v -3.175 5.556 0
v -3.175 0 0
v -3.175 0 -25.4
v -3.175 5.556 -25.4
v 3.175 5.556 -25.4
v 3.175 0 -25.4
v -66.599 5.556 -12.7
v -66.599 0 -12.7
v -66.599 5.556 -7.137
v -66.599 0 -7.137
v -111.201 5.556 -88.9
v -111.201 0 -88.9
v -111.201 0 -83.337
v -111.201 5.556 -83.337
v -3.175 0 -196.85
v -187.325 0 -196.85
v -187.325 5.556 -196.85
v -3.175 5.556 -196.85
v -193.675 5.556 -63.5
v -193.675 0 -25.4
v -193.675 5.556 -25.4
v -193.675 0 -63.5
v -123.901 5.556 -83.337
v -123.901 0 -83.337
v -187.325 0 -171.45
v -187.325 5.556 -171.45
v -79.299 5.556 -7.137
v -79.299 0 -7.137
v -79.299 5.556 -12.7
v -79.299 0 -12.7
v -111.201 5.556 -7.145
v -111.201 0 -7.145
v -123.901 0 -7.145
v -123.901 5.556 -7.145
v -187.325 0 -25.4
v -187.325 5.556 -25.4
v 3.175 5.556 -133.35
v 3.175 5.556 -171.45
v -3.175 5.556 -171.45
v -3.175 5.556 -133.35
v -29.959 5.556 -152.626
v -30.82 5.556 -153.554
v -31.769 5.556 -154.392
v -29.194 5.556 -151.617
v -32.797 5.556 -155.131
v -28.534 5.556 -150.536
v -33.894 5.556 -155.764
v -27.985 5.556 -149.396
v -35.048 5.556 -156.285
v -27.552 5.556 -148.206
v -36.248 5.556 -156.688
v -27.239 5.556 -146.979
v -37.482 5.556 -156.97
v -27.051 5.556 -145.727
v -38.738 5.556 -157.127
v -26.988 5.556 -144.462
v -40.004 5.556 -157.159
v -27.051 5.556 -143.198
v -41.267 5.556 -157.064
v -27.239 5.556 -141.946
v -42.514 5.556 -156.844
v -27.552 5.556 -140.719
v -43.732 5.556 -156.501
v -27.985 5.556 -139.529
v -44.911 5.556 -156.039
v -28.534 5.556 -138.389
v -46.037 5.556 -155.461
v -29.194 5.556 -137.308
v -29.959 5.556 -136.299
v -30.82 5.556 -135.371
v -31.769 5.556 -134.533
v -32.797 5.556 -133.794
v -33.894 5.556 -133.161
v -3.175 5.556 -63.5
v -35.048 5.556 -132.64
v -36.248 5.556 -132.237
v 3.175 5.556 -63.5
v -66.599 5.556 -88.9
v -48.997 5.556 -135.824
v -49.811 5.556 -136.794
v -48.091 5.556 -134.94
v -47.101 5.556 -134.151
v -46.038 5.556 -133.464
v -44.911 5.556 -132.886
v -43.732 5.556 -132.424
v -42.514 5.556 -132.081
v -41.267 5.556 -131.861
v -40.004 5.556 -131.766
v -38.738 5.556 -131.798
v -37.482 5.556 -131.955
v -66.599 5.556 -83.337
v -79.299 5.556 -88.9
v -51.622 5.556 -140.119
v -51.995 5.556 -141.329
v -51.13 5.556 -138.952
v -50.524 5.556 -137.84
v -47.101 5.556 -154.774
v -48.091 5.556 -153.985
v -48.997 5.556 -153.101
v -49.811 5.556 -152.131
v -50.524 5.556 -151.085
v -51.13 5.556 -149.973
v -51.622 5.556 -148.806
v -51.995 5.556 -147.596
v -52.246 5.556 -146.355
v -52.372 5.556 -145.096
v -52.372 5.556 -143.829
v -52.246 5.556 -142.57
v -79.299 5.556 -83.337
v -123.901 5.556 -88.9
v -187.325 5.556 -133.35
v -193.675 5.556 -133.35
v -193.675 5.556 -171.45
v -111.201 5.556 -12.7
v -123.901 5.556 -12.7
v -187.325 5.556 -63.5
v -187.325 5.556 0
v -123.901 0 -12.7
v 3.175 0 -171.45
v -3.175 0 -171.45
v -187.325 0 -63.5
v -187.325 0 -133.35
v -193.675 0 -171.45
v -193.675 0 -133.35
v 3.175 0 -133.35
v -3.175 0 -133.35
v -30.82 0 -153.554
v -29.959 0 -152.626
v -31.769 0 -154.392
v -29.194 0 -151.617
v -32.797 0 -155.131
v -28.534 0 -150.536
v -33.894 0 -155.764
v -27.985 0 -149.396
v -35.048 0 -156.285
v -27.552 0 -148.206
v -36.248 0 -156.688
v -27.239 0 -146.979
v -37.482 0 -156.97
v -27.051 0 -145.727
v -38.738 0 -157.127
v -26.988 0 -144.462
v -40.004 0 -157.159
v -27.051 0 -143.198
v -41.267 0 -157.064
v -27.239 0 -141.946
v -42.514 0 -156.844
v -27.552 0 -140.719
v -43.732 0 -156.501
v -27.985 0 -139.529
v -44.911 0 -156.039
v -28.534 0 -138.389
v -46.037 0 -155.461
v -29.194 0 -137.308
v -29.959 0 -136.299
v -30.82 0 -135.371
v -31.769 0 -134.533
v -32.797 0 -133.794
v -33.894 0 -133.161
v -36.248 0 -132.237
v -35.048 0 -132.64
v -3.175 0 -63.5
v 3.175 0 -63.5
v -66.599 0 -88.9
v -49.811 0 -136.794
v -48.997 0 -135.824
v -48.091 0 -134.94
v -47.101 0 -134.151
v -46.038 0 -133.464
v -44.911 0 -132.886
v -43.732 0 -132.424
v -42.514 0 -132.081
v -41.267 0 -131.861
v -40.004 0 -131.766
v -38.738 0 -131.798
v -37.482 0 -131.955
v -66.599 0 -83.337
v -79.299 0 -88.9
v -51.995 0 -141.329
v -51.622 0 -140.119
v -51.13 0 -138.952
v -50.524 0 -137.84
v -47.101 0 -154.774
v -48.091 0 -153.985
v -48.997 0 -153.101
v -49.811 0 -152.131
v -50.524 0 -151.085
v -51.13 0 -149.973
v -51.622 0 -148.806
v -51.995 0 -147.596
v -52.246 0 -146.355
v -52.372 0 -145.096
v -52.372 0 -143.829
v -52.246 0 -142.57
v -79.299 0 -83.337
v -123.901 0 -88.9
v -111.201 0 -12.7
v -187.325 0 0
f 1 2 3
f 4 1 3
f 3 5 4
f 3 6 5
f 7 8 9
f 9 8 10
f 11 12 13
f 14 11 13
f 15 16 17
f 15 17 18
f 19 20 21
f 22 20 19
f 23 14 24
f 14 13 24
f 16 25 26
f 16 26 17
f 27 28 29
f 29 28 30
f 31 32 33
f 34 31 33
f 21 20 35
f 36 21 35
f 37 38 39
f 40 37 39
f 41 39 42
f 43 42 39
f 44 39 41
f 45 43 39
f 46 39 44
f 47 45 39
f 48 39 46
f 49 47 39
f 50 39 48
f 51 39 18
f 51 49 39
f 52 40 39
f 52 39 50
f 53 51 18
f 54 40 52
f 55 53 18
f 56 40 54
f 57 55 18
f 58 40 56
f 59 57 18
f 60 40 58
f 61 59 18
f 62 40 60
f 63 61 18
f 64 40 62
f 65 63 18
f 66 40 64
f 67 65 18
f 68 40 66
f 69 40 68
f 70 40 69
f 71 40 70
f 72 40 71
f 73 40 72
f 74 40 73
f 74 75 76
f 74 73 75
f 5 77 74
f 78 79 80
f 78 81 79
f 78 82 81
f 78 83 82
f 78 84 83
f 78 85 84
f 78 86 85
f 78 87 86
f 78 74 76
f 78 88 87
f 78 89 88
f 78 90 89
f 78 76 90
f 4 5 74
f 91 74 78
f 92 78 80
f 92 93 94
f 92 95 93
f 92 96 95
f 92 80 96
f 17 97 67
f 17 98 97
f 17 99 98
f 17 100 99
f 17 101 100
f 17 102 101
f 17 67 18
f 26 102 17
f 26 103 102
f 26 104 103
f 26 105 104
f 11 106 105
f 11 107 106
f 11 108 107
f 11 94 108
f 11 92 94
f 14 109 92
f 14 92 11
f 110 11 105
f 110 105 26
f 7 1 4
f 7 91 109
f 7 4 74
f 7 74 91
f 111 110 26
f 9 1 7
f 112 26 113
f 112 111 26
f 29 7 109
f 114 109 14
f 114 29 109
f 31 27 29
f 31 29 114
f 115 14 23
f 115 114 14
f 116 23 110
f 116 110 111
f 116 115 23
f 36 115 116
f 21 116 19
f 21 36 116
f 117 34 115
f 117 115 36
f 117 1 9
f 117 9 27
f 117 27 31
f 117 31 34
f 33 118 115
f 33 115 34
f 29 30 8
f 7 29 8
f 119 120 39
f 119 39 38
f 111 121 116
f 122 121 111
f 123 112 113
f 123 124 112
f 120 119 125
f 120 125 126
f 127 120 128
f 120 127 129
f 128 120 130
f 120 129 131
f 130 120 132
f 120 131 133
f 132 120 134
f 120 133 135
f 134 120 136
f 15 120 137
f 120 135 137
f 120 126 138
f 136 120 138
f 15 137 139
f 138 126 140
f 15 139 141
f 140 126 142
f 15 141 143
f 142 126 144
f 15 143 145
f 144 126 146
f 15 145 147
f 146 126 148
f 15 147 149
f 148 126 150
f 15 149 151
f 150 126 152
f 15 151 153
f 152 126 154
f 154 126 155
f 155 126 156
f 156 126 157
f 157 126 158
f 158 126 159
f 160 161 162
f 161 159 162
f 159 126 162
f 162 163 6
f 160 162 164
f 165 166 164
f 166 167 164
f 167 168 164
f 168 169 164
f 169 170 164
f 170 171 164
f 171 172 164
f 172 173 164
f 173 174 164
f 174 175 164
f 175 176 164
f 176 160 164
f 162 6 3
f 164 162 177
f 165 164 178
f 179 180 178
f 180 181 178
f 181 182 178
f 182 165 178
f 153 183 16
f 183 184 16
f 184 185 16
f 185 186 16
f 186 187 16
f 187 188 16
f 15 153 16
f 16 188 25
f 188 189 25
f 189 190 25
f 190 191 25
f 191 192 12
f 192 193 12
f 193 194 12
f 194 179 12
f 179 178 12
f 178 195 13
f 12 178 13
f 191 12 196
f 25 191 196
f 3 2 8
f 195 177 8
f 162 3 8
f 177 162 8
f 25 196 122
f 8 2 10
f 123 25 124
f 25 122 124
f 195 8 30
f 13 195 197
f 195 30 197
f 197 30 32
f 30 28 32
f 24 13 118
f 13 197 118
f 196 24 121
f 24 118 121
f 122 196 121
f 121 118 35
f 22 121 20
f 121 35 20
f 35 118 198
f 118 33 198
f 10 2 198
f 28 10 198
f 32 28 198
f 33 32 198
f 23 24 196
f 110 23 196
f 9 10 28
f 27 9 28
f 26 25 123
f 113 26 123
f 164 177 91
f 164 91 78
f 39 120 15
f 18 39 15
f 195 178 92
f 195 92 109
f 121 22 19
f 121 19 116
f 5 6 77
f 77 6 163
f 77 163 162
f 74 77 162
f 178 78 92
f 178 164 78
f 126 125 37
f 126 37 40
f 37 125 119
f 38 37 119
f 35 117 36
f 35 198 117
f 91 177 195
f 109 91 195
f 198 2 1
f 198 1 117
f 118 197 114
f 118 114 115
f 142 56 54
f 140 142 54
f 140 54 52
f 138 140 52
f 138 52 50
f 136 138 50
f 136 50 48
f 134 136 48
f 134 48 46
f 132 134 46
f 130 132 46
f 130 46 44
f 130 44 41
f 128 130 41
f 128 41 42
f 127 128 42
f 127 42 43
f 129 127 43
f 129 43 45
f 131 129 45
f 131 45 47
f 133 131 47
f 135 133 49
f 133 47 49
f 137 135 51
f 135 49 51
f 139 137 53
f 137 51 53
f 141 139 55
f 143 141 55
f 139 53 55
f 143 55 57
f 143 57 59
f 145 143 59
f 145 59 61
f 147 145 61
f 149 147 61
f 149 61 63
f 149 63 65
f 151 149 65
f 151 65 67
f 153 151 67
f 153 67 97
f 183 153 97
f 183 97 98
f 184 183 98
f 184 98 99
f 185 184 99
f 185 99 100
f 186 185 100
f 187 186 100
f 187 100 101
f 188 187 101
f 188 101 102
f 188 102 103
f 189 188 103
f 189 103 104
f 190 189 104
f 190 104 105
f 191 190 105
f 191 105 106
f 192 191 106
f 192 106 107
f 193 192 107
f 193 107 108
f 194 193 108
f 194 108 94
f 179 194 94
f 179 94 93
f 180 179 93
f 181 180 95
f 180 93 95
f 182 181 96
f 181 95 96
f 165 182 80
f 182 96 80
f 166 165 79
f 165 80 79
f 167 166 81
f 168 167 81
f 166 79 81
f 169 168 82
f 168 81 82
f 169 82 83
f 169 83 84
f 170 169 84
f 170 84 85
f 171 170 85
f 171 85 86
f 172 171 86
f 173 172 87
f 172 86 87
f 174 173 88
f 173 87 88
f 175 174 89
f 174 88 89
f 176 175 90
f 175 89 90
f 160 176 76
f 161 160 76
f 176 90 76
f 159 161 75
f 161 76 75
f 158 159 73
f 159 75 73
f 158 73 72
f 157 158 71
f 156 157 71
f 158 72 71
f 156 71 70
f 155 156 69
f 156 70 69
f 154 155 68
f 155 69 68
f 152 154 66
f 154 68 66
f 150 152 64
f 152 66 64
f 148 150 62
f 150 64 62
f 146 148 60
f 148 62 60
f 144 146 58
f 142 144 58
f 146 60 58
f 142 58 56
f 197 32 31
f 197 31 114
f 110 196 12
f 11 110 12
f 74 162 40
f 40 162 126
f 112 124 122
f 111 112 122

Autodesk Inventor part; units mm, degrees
ref_plane "YZ Plane" through (0, 0, 0) normal (1, 0, 0) x (0, 1, 0)
ref_plane "XZ Plane" through (0, 0, 0) normal (0, 1, 0) x (-1, 0, 0)
ref_plane "XY Plane" through (0, 0, 0) normal (0, 0, 1) x (1, 0, 0)
sketch "Sketch1" plane through (0, 0, 0) normal (0, 1, 0) x (-1, 0, 0)
  line L0 (3.175, 0) -> (187.325, 0)
  line L1 (187.325, -196.85) -> (3.175, -196.85)
  line L2 (111.2012, -7.145) -> (111.2012, -12.7)
  line L3 (111.2012, -12.7) -> (123.9012, -12.7)
  line L4 (123.9012, -12.7) -> (123.9012, -7.145)
  line L5 (79.2988, -7.1374) -> (79.2988, -12.7)
  line L6 (79.2988, -12.7) -> (66.5988, -12.7)
  line L7 (66.5988, -12.7) -> (66.5988, -7.1374)
  line L8 (66.5988, -88.9) -> (79.2988, -88.9)
  line L9 (79.2988, -88.9) -> (79.2988, -83.3374)
  line L10 (66.5988, -83.3374) -> (66.5988, -88.9)
  line L11 (123.9012, -88.9) -> (111.2012, -88.9)
  line L12 (111.2012, -88.9) -> (111.2012, -83.3374)
  line L13 (123.9012, -83.3374) -> (123.9012, -88.9)
  line L14 (190.5, -25.4) -> (193.675, -25.4)
  line L15 (193.675, -63.5) -> (190.5, -63.5)
  line L16 (0, -25.4) -> (-3.175, -25.4)
  line L17 (-3.175, -63.5) -> (0, -63.5)
  line L18 (190.5, -171.45) -> (193.675, -171.45)
  line L19 (193.675, -133.35) -> (190.5, -133.35)
  line L20 (0, -171.45) -> (-3.175, -171.45)
  line L21 (-3.175, -133.35) -> (0, -133.35)
  line L22 (190.5, -171.45) -> (193.675, -171.45)
  line L23 (190.5, -25.4) -> (187.325, -25.4)
  line L24 (190.5, -63.5) -> (187.325, -63.5)
  line L25 (190.5, -133.35) -> (187.325, -133.35)
  line L26 (190.5, -171.45) -> (187.325, -171.45)
  line L27 (193.675, -25.4) -> (193.675, -63.5)
  line L28 (193.675, -133.35) -> (193.675, -171.45)
  line L29 (187.325, -171.45) -> (187.325, -196.85)
  line L30 (187.325, 0) -> (187.325, -25.4)
  line L31 (187.325, -63.5) -> (187.325, -133.35)
  line L32 (0, -171.45) -> (3.175, -171.45)
  line L33 (0, -133.35) -> (3.175, -133.35)
  line L34 (0, -63.5) -> (3.175, -63.5)
  line L35 (0, -25.4) -> (3.175, -25.4)
  line L36 (-3.175, -25.4) -> (-3.175, -63.5)
  line L37 (-3.175, -133.35) -> (-3.175, -171.45)
  line L38 (3.175, 0) -> (3.175, -25.4)
  line L39 (3.175, -63.5) -> (3.175, -133.35)
  line L40 (3.175, -171.45) -> (3.175, -196.85)
  line L41 (123.9012, -12.7) -> (111.2012, -12.7)
  line L42 (111.2012, -12.7) -> (111.2012, -7.145)
  line L43 (111.2012, -7.145) -> (123.9012, -7.145)
  line L44 (123.9012, -7.145) -> (123.9012, -12.7)
  line L45 (123.9012, -88.9) -> (111.2012, -88.9)
  line L46 (111.2012, -88.9) -> (111.2012, -83.3374)
  line L47 (111.2012, -83.3374) -> (123.9012, -83.3374)
  line L48 (123.9012, -83.3374) -> (123.9012, -88.9)
  line L49 (79.2988, -12.7) -> (66.5988, -12.7)
  line L50 (66.5988, -12.7) -> (66.5988, -7.1374)
  line L51 (66.5988, -7.1374) -> (79.2988, -7.1374)
  line L52 (79.2988, -7.1374) -> (79.2988, -12.7)
  line L53 (79.2988, -88.9) -> (66.5988, -88.9)
  line L54 (66.5988, -88.9) -> (66.5988, -83.3374)
  line L55 (66.5988, -83.3374) -> (79.2988, -83.3374)
  line L56 (79.2988, -83.3374) -> (79.2988, -88.9)
  point P0 (0, 0)
  dimension "d4" = 12.7
  dimension "d6" = 12.7
  dimension "d29" = 5.555
  dimension "d31" = 5.5626
extrude "Extrusion1" add sketch "Sketch1" along normal blind 5.5563
sketch "Sketch2" plane through (0, 5.5563, 0) normal (0, 1, 0) x (1, 0, 0)
  circle A0 centre (-39.6875, 144.4625) radius 12.7
  point P0 (0, 0)
extrude "Extrusion2" cut sketch "Sketch2" against normal blind 6.35
properties part number "mid_floor"
